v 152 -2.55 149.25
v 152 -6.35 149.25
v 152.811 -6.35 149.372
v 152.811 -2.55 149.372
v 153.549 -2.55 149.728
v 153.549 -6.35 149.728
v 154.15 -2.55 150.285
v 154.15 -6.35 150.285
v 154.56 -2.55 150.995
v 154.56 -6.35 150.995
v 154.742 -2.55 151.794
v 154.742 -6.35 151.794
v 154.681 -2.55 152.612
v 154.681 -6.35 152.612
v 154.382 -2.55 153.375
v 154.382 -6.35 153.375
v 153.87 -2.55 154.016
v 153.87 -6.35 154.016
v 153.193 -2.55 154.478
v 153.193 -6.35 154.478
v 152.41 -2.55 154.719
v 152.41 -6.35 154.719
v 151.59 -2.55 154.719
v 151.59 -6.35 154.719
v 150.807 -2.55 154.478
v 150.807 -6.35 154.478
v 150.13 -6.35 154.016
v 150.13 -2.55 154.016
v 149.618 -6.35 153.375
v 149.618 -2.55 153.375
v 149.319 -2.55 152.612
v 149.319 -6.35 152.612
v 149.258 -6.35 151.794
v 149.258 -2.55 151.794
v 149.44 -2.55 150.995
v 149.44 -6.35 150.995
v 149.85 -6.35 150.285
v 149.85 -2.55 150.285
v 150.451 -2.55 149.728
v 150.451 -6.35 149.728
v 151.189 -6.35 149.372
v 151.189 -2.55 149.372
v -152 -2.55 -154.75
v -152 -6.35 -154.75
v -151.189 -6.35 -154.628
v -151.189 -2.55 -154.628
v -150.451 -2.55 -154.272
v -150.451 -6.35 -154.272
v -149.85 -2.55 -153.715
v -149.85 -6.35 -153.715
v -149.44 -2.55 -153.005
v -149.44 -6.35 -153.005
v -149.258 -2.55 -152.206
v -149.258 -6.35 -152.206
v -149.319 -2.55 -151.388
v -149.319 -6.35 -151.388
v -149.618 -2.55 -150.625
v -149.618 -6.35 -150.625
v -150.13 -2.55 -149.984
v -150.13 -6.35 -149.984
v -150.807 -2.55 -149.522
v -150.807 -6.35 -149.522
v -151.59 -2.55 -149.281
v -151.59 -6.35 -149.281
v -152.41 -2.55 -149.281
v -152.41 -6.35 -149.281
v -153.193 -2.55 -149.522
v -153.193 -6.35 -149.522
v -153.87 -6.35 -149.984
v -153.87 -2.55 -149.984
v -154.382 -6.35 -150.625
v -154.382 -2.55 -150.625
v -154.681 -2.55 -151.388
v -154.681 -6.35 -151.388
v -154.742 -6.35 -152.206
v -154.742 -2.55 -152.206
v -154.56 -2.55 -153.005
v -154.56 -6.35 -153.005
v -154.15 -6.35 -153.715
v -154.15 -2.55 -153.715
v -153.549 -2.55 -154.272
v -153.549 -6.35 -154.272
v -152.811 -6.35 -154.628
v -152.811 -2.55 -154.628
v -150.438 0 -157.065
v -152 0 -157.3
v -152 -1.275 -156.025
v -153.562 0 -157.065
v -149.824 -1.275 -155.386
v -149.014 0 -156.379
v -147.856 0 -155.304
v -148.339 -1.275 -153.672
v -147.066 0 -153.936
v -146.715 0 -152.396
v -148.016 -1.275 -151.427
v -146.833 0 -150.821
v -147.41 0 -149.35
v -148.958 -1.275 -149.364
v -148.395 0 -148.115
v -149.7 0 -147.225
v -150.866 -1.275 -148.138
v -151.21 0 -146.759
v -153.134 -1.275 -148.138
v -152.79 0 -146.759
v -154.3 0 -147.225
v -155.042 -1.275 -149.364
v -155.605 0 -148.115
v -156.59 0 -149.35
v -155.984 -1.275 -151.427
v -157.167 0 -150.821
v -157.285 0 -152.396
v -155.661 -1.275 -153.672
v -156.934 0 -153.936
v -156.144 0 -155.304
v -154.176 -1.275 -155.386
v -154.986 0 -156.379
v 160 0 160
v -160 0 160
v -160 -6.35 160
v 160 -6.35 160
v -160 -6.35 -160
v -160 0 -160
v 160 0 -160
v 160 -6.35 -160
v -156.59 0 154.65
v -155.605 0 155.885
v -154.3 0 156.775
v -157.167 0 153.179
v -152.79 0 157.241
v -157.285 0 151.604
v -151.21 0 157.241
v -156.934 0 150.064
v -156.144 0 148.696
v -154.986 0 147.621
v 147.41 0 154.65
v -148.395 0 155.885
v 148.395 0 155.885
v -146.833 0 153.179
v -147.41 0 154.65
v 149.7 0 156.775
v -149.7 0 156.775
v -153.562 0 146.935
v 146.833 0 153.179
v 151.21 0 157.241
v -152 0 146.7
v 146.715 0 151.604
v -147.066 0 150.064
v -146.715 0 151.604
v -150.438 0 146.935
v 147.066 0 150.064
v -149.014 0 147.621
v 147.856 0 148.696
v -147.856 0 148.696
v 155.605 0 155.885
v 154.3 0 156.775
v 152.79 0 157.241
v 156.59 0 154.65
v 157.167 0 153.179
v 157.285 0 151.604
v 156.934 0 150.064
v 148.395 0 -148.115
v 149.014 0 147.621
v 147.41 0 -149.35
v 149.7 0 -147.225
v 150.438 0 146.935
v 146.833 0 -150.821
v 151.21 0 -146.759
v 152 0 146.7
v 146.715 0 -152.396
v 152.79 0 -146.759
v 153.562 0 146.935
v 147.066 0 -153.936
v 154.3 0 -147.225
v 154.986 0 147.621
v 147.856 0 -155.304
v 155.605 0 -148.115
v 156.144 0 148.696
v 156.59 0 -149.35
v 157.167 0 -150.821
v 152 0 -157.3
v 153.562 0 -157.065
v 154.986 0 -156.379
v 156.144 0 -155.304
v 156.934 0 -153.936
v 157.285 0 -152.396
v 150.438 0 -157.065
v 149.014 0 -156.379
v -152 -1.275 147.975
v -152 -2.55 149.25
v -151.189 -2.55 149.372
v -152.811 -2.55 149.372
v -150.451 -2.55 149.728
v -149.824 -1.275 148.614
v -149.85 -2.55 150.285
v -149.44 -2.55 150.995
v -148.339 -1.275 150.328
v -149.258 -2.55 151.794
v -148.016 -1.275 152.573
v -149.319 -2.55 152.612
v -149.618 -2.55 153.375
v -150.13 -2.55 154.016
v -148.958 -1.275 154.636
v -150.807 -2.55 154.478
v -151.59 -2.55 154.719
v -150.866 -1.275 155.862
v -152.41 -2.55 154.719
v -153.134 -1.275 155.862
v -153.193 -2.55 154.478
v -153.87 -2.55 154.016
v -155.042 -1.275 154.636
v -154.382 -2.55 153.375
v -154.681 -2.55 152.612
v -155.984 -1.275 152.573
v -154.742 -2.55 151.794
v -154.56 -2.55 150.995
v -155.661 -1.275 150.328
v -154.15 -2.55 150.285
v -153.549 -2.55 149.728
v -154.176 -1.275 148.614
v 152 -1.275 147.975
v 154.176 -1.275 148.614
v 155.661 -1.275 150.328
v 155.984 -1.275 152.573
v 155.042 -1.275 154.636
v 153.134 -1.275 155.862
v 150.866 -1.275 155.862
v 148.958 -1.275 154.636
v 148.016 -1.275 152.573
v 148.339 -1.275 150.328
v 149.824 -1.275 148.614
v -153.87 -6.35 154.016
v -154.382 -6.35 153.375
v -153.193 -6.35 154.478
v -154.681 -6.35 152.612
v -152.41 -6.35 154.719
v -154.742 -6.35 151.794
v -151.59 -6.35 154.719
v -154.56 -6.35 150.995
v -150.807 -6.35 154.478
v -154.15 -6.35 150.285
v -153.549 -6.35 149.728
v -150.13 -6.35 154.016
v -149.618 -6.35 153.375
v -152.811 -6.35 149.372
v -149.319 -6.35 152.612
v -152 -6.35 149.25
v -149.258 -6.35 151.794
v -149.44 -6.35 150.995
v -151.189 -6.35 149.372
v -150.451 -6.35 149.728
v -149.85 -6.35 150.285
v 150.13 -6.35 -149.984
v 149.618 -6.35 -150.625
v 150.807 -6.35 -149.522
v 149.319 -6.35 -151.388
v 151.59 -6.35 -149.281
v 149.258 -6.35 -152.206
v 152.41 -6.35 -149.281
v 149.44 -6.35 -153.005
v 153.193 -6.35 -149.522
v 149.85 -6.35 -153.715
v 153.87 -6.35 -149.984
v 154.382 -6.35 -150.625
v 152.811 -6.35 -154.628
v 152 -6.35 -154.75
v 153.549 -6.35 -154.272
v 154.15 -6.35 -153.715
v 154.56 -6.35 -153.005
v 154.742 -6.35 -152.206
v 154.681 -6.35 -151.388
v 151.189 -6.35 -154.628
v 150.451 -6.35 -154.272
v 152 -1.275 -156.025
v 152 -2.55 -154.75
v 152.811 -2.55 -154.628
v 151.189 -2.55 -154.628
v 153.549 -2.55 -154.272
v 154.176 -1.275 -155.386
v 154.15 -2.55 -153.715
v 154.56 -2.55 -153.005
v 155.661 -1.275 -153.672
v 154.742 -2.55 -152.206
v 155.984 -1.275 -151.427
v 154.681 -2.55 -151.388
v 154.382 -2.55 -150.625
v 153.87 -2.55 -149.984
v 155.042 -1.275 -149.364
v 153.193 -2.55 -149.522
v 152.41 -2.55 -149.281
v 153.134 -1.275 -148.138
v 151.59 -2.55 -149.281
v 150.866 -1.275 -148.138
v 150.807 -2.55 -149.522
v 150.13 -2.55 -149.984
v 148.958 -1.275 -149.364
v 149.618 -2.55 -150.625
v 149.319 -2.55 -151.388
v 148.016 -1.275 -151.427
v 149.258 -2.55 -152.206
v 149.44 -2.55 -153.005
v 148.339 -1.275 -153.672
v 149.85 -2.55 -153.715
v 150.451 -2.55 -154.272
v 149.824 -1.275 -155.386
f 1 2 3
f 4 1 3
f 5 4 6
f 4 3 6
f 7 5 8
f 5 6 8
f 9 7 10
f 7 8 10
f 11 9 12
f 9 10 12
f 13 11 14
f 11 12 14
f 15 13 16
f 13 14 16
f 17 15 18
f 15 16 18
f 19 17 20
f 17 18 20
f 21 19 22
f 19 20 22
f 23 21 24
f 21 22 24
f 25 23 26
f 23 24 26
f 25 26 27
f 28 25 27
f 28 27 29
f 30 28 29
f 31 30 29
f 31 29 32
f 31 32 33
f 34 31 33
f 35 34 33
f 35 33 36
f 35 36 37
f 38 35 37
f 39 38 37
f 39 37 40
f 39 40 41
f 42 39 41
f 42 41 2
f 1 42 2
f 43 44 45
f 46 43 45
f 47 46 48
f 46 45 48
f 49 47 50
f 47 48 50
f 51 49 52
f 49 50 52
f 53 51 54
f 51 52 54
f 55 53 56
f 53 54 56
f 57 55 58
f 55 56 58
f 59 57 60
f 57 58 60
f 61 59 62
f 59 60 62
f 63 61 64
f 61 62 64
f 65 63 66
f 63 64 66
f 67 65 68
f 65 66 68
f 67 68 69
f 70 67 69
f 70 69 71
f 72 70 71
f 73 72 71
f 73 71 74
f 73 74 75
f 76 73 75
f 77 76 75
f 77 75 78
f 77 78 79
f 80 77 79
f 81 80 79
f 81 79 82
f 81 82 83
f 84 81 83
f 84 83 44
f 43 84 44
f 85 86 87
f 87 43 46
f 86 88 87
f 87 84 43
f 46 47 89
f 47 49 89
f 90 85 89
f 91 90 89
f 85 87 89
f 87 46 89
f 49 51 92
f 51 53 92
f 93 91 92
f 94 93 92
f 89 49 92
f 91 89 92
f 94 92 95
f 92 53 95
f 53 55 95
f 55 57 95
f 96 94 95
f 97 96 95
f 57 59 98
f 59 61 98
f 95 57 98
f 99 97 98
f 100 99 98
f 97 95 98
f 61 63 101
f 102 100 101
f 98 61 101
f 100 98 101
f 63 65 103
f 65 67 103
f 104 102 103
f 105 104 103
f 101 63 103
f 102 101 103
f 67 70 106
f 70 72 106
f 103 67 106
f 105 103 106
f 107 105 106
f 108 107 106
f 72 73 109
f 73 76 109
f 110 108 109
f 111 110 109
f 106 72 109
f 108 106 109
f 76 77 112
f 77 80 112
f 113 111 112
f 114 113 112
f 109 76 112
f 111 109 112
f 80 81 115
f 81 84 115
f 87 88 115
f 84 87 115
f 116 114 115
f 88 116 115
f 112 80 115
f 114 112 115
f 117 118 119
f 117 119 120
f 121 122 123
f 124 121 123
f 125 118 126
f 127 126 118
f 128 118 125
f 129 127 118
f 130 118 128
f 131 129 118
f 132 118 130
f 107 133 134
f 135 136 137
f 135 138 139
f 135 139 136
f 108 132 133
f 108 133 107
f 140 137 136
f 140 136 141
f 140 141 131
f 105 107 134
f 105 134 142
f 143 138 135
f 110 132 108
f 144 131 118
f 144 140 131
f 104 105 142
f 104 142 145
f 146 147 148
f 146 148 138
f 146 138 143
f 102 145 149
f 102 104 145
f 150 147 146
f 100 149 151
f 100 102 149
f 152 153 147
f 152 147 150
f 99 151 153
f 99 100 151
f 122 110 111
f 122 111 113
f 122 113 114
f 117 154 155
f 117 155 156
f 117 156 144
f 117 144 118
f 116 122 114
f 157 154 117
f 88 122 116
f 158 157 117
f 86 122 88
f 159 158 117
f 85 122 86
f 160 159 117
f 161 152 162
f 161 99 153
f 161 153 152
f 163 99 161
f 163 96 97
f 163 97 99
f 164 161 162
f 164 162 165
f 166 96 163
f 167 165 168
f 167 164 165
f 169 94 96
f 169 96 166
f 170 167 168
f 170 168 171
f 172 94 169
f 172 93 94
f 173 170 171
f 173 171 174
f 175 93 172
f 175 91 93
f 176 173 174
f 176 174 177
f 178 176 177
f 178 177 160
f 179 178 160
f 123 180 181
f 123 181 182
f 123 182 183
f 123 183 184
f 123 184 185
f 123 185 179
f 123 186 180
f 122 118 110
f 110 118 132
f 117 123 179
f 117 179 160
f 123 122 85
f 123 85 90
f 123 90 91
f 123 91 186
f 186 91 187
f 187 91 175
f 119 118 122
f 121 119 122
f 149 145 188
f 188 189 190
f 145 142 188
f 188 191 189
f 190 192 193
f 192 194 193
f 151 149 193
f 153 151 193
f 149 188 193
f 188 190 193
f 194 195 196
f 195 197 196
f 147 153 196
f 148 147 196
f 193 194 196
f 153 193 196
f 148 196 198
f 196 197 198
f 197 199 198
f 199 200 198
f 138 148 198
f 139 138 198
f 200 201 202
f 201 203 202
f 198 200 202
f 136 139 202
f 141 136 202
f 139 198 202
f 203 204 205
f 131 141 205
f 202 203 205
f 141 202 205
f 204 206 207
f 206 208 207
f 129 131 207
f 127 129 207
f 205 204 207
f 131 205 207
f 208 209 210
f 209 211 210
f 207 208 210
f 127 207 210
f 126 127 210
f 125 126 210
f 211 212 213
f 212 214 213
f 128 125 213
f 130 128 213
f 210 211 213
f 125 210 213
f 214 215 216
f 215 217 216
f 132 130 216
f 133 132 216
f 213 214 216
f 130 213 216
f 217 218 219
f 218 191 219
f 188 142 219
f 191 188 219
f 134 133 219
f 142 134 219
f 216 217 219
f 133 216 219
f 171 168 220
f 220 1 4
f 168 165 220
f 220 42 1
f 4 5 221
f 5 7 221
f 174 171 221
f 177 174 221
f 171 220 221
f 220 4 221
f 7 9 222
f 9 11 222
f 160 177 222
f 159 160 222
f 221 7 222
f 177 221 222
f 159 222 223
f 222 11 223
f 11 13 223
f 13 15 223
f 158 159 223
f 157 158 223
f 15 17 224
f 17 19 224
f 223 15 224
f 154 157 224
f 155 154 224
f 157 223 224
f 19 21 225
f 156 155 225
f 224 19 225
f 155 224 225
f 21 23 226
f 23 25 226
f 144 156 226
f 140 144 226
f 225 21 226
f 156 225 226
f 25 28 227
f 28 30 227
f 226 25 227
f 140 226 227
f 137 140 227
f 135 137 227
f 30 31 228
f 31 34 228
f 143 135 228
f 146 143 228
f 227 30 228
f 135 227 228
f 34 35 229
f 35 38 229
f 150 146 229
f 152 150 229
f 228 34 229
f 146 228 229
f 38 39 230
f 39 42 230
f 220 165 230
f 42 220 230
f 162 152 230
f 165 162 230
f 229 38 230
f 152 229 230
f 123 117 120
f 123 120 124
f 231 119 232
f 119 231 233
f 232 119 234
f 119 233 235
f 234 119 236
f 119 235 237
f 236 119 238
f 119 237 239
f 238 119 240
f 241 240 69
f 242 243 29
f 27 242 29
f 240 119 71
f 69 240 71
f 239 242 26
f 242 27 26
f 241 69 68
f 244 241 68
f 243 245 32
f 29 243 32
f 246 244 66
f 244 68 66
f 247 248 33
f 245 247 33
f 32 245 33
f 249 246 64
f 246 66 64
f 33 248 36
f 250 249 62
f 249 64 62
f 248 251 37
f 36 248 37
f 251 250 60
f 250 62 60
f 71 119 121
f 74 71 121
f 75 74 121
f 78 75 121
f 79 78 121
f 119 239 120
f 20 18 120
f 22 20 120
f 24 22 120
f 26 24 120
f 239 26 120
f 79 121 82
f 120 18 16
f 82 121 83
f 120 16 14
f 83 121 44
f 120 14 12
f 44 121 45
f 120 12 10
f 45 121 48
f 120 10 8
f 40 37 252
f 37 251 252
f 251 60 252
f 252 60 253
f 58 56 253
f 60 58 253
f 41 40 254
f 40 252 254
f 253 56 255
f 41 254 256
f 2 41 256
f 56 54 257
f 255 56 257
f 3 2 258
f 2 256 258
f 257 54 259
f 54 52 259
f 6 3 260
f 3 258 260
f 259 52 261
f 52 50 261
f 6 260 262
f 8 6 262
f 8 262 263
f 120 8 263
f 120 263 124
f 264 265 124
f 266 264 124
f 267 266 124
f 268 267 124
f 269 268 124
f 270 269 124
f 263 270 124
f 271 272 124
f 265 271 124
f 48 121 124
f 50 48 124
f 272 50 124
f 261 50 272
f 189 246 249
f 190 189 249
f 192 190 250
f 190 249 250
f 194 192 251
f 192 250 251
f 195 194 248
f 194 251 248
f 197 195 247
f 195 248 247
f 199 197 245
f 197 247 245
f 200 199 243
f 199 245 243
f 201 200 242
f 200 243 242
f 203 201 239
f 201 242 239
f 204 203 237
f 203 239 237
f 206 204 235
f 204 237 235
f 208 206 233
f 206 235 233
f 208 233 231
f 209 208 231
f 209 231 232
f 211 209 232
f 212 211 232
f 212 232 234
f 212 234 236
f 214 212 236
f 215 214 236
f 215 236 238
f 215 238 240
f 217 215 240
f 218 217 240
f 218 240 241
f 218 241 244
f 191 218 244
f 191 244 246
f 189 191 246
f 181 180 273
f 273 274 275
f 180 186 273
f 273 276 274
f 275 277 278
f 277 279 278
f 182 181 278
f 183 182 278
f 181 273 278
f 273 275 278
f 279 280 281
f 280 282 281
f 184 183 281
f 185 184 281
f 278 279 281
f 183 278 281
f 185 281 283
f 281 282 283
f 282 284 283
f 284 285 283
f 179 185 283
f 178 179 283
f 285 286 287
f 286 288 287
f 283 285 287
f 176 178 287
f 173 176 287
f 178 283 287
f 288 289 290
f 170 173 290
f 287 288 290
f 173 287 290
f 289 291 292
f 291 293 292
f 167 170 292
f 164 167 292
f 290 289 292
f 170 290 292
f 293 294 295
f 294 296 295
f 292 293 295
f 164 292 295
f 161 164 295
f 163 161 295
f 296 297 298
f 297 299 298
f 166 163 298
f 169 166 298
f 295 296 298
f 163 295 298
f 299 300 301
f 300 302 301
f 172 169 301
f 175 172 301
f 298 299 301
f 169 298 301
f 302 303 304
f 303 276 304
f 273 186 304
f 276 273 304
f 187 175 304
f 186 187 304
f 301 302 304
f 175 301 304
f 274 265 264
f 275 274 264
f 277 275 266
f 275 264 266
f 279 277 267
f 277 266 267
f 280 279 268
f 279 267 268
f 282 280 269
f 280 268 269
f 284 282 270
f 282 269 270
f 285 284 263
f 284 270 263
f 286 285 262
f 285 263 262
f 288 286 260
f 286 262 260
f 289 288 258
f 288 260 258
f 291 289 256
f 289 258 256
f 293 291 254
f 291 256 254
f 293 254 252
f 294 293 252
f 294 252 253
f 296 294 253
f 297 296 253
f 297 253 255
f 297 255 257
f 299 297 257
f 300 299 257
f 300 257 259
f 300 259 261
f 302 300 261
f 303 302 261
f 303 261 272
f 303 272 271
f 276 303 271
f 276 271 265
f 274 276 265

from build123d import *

# Parameters (mm, degrees)
SKETCH1_W                                       = 320
SKETCH1_H                                       = 320
SKETCH1_R                                       = 2.525
BOSS_EXTRUDE1_DEPTH                             = 6.35
CSK_FOR_M5_FLAT_HEAD_MACHINE_SCREW1_D           = 5.5
CSK_FOR_M5_FLAT_HEAD_MACHINE_SCREW1_DEPTH       = 6.35
CSK_FOR_M5_FLAT_HEAD_MACHINE_SCREW1_CSINK_D     = 10.6
CSK_FOR_M5_FLAT_HEAD_MACHINE_SCREW1_CSINK_ANGLE = 90


with BuildPart() as part:
    # Sketch1 → Boss-Extrude1 (new body)
    with BuildSketch(Plane(origin=(0, 0, 0), x_dir=(1, 0, 0), z_dir=(0, 1, 0))):
        Rectangle(SKETCH1_W, SKETCH1_H)
        with Locations((152, 152)):
            Circle(SKETCH1_R, mode=Mode.SUBTRACT)
        with Locations((-152, -152)):
            Circle(SKETCH1_R, mode=Mode.SUBTRACT)
        with Locations((152, -152)):
            Circle(SKETCH1_R, mode=Mode.SUBTRACT)
        with Locations((-152, 152)):
            Circle(SKETCH1_R, mode=Mode.SUBTRACT)
    extrude(amount=-BOSS_EXTRUDE1_DEPTH)

    # CSK for M5 Flat Head Machine Screw1
    with Locations(Plane(origin=(-152, 0, -152), x_dir=(0, 0, 1), z_dir=(0, 1, 0))):
        with Locations((0, 0), (0, 304), (304, 304), (304, 0)):
            CounterSinkHole(CSK_FOR_M5_FLAT_HEAD_MACHINE_SCREW1_D / 2, CSK_FOR_M5_FLAT_HEAD_MACHINE_SCREW1_CSINK_D / 2, depth=CSK_FOR_M5_FLAT_HEAD_MACHINE_SCREW1_DEPTH, counter_sink_angle=CSK_FOR_M5_FLAT_HEAD_MACHINE_SCREW1_CSINK_ANGLE)


solid = part.part
